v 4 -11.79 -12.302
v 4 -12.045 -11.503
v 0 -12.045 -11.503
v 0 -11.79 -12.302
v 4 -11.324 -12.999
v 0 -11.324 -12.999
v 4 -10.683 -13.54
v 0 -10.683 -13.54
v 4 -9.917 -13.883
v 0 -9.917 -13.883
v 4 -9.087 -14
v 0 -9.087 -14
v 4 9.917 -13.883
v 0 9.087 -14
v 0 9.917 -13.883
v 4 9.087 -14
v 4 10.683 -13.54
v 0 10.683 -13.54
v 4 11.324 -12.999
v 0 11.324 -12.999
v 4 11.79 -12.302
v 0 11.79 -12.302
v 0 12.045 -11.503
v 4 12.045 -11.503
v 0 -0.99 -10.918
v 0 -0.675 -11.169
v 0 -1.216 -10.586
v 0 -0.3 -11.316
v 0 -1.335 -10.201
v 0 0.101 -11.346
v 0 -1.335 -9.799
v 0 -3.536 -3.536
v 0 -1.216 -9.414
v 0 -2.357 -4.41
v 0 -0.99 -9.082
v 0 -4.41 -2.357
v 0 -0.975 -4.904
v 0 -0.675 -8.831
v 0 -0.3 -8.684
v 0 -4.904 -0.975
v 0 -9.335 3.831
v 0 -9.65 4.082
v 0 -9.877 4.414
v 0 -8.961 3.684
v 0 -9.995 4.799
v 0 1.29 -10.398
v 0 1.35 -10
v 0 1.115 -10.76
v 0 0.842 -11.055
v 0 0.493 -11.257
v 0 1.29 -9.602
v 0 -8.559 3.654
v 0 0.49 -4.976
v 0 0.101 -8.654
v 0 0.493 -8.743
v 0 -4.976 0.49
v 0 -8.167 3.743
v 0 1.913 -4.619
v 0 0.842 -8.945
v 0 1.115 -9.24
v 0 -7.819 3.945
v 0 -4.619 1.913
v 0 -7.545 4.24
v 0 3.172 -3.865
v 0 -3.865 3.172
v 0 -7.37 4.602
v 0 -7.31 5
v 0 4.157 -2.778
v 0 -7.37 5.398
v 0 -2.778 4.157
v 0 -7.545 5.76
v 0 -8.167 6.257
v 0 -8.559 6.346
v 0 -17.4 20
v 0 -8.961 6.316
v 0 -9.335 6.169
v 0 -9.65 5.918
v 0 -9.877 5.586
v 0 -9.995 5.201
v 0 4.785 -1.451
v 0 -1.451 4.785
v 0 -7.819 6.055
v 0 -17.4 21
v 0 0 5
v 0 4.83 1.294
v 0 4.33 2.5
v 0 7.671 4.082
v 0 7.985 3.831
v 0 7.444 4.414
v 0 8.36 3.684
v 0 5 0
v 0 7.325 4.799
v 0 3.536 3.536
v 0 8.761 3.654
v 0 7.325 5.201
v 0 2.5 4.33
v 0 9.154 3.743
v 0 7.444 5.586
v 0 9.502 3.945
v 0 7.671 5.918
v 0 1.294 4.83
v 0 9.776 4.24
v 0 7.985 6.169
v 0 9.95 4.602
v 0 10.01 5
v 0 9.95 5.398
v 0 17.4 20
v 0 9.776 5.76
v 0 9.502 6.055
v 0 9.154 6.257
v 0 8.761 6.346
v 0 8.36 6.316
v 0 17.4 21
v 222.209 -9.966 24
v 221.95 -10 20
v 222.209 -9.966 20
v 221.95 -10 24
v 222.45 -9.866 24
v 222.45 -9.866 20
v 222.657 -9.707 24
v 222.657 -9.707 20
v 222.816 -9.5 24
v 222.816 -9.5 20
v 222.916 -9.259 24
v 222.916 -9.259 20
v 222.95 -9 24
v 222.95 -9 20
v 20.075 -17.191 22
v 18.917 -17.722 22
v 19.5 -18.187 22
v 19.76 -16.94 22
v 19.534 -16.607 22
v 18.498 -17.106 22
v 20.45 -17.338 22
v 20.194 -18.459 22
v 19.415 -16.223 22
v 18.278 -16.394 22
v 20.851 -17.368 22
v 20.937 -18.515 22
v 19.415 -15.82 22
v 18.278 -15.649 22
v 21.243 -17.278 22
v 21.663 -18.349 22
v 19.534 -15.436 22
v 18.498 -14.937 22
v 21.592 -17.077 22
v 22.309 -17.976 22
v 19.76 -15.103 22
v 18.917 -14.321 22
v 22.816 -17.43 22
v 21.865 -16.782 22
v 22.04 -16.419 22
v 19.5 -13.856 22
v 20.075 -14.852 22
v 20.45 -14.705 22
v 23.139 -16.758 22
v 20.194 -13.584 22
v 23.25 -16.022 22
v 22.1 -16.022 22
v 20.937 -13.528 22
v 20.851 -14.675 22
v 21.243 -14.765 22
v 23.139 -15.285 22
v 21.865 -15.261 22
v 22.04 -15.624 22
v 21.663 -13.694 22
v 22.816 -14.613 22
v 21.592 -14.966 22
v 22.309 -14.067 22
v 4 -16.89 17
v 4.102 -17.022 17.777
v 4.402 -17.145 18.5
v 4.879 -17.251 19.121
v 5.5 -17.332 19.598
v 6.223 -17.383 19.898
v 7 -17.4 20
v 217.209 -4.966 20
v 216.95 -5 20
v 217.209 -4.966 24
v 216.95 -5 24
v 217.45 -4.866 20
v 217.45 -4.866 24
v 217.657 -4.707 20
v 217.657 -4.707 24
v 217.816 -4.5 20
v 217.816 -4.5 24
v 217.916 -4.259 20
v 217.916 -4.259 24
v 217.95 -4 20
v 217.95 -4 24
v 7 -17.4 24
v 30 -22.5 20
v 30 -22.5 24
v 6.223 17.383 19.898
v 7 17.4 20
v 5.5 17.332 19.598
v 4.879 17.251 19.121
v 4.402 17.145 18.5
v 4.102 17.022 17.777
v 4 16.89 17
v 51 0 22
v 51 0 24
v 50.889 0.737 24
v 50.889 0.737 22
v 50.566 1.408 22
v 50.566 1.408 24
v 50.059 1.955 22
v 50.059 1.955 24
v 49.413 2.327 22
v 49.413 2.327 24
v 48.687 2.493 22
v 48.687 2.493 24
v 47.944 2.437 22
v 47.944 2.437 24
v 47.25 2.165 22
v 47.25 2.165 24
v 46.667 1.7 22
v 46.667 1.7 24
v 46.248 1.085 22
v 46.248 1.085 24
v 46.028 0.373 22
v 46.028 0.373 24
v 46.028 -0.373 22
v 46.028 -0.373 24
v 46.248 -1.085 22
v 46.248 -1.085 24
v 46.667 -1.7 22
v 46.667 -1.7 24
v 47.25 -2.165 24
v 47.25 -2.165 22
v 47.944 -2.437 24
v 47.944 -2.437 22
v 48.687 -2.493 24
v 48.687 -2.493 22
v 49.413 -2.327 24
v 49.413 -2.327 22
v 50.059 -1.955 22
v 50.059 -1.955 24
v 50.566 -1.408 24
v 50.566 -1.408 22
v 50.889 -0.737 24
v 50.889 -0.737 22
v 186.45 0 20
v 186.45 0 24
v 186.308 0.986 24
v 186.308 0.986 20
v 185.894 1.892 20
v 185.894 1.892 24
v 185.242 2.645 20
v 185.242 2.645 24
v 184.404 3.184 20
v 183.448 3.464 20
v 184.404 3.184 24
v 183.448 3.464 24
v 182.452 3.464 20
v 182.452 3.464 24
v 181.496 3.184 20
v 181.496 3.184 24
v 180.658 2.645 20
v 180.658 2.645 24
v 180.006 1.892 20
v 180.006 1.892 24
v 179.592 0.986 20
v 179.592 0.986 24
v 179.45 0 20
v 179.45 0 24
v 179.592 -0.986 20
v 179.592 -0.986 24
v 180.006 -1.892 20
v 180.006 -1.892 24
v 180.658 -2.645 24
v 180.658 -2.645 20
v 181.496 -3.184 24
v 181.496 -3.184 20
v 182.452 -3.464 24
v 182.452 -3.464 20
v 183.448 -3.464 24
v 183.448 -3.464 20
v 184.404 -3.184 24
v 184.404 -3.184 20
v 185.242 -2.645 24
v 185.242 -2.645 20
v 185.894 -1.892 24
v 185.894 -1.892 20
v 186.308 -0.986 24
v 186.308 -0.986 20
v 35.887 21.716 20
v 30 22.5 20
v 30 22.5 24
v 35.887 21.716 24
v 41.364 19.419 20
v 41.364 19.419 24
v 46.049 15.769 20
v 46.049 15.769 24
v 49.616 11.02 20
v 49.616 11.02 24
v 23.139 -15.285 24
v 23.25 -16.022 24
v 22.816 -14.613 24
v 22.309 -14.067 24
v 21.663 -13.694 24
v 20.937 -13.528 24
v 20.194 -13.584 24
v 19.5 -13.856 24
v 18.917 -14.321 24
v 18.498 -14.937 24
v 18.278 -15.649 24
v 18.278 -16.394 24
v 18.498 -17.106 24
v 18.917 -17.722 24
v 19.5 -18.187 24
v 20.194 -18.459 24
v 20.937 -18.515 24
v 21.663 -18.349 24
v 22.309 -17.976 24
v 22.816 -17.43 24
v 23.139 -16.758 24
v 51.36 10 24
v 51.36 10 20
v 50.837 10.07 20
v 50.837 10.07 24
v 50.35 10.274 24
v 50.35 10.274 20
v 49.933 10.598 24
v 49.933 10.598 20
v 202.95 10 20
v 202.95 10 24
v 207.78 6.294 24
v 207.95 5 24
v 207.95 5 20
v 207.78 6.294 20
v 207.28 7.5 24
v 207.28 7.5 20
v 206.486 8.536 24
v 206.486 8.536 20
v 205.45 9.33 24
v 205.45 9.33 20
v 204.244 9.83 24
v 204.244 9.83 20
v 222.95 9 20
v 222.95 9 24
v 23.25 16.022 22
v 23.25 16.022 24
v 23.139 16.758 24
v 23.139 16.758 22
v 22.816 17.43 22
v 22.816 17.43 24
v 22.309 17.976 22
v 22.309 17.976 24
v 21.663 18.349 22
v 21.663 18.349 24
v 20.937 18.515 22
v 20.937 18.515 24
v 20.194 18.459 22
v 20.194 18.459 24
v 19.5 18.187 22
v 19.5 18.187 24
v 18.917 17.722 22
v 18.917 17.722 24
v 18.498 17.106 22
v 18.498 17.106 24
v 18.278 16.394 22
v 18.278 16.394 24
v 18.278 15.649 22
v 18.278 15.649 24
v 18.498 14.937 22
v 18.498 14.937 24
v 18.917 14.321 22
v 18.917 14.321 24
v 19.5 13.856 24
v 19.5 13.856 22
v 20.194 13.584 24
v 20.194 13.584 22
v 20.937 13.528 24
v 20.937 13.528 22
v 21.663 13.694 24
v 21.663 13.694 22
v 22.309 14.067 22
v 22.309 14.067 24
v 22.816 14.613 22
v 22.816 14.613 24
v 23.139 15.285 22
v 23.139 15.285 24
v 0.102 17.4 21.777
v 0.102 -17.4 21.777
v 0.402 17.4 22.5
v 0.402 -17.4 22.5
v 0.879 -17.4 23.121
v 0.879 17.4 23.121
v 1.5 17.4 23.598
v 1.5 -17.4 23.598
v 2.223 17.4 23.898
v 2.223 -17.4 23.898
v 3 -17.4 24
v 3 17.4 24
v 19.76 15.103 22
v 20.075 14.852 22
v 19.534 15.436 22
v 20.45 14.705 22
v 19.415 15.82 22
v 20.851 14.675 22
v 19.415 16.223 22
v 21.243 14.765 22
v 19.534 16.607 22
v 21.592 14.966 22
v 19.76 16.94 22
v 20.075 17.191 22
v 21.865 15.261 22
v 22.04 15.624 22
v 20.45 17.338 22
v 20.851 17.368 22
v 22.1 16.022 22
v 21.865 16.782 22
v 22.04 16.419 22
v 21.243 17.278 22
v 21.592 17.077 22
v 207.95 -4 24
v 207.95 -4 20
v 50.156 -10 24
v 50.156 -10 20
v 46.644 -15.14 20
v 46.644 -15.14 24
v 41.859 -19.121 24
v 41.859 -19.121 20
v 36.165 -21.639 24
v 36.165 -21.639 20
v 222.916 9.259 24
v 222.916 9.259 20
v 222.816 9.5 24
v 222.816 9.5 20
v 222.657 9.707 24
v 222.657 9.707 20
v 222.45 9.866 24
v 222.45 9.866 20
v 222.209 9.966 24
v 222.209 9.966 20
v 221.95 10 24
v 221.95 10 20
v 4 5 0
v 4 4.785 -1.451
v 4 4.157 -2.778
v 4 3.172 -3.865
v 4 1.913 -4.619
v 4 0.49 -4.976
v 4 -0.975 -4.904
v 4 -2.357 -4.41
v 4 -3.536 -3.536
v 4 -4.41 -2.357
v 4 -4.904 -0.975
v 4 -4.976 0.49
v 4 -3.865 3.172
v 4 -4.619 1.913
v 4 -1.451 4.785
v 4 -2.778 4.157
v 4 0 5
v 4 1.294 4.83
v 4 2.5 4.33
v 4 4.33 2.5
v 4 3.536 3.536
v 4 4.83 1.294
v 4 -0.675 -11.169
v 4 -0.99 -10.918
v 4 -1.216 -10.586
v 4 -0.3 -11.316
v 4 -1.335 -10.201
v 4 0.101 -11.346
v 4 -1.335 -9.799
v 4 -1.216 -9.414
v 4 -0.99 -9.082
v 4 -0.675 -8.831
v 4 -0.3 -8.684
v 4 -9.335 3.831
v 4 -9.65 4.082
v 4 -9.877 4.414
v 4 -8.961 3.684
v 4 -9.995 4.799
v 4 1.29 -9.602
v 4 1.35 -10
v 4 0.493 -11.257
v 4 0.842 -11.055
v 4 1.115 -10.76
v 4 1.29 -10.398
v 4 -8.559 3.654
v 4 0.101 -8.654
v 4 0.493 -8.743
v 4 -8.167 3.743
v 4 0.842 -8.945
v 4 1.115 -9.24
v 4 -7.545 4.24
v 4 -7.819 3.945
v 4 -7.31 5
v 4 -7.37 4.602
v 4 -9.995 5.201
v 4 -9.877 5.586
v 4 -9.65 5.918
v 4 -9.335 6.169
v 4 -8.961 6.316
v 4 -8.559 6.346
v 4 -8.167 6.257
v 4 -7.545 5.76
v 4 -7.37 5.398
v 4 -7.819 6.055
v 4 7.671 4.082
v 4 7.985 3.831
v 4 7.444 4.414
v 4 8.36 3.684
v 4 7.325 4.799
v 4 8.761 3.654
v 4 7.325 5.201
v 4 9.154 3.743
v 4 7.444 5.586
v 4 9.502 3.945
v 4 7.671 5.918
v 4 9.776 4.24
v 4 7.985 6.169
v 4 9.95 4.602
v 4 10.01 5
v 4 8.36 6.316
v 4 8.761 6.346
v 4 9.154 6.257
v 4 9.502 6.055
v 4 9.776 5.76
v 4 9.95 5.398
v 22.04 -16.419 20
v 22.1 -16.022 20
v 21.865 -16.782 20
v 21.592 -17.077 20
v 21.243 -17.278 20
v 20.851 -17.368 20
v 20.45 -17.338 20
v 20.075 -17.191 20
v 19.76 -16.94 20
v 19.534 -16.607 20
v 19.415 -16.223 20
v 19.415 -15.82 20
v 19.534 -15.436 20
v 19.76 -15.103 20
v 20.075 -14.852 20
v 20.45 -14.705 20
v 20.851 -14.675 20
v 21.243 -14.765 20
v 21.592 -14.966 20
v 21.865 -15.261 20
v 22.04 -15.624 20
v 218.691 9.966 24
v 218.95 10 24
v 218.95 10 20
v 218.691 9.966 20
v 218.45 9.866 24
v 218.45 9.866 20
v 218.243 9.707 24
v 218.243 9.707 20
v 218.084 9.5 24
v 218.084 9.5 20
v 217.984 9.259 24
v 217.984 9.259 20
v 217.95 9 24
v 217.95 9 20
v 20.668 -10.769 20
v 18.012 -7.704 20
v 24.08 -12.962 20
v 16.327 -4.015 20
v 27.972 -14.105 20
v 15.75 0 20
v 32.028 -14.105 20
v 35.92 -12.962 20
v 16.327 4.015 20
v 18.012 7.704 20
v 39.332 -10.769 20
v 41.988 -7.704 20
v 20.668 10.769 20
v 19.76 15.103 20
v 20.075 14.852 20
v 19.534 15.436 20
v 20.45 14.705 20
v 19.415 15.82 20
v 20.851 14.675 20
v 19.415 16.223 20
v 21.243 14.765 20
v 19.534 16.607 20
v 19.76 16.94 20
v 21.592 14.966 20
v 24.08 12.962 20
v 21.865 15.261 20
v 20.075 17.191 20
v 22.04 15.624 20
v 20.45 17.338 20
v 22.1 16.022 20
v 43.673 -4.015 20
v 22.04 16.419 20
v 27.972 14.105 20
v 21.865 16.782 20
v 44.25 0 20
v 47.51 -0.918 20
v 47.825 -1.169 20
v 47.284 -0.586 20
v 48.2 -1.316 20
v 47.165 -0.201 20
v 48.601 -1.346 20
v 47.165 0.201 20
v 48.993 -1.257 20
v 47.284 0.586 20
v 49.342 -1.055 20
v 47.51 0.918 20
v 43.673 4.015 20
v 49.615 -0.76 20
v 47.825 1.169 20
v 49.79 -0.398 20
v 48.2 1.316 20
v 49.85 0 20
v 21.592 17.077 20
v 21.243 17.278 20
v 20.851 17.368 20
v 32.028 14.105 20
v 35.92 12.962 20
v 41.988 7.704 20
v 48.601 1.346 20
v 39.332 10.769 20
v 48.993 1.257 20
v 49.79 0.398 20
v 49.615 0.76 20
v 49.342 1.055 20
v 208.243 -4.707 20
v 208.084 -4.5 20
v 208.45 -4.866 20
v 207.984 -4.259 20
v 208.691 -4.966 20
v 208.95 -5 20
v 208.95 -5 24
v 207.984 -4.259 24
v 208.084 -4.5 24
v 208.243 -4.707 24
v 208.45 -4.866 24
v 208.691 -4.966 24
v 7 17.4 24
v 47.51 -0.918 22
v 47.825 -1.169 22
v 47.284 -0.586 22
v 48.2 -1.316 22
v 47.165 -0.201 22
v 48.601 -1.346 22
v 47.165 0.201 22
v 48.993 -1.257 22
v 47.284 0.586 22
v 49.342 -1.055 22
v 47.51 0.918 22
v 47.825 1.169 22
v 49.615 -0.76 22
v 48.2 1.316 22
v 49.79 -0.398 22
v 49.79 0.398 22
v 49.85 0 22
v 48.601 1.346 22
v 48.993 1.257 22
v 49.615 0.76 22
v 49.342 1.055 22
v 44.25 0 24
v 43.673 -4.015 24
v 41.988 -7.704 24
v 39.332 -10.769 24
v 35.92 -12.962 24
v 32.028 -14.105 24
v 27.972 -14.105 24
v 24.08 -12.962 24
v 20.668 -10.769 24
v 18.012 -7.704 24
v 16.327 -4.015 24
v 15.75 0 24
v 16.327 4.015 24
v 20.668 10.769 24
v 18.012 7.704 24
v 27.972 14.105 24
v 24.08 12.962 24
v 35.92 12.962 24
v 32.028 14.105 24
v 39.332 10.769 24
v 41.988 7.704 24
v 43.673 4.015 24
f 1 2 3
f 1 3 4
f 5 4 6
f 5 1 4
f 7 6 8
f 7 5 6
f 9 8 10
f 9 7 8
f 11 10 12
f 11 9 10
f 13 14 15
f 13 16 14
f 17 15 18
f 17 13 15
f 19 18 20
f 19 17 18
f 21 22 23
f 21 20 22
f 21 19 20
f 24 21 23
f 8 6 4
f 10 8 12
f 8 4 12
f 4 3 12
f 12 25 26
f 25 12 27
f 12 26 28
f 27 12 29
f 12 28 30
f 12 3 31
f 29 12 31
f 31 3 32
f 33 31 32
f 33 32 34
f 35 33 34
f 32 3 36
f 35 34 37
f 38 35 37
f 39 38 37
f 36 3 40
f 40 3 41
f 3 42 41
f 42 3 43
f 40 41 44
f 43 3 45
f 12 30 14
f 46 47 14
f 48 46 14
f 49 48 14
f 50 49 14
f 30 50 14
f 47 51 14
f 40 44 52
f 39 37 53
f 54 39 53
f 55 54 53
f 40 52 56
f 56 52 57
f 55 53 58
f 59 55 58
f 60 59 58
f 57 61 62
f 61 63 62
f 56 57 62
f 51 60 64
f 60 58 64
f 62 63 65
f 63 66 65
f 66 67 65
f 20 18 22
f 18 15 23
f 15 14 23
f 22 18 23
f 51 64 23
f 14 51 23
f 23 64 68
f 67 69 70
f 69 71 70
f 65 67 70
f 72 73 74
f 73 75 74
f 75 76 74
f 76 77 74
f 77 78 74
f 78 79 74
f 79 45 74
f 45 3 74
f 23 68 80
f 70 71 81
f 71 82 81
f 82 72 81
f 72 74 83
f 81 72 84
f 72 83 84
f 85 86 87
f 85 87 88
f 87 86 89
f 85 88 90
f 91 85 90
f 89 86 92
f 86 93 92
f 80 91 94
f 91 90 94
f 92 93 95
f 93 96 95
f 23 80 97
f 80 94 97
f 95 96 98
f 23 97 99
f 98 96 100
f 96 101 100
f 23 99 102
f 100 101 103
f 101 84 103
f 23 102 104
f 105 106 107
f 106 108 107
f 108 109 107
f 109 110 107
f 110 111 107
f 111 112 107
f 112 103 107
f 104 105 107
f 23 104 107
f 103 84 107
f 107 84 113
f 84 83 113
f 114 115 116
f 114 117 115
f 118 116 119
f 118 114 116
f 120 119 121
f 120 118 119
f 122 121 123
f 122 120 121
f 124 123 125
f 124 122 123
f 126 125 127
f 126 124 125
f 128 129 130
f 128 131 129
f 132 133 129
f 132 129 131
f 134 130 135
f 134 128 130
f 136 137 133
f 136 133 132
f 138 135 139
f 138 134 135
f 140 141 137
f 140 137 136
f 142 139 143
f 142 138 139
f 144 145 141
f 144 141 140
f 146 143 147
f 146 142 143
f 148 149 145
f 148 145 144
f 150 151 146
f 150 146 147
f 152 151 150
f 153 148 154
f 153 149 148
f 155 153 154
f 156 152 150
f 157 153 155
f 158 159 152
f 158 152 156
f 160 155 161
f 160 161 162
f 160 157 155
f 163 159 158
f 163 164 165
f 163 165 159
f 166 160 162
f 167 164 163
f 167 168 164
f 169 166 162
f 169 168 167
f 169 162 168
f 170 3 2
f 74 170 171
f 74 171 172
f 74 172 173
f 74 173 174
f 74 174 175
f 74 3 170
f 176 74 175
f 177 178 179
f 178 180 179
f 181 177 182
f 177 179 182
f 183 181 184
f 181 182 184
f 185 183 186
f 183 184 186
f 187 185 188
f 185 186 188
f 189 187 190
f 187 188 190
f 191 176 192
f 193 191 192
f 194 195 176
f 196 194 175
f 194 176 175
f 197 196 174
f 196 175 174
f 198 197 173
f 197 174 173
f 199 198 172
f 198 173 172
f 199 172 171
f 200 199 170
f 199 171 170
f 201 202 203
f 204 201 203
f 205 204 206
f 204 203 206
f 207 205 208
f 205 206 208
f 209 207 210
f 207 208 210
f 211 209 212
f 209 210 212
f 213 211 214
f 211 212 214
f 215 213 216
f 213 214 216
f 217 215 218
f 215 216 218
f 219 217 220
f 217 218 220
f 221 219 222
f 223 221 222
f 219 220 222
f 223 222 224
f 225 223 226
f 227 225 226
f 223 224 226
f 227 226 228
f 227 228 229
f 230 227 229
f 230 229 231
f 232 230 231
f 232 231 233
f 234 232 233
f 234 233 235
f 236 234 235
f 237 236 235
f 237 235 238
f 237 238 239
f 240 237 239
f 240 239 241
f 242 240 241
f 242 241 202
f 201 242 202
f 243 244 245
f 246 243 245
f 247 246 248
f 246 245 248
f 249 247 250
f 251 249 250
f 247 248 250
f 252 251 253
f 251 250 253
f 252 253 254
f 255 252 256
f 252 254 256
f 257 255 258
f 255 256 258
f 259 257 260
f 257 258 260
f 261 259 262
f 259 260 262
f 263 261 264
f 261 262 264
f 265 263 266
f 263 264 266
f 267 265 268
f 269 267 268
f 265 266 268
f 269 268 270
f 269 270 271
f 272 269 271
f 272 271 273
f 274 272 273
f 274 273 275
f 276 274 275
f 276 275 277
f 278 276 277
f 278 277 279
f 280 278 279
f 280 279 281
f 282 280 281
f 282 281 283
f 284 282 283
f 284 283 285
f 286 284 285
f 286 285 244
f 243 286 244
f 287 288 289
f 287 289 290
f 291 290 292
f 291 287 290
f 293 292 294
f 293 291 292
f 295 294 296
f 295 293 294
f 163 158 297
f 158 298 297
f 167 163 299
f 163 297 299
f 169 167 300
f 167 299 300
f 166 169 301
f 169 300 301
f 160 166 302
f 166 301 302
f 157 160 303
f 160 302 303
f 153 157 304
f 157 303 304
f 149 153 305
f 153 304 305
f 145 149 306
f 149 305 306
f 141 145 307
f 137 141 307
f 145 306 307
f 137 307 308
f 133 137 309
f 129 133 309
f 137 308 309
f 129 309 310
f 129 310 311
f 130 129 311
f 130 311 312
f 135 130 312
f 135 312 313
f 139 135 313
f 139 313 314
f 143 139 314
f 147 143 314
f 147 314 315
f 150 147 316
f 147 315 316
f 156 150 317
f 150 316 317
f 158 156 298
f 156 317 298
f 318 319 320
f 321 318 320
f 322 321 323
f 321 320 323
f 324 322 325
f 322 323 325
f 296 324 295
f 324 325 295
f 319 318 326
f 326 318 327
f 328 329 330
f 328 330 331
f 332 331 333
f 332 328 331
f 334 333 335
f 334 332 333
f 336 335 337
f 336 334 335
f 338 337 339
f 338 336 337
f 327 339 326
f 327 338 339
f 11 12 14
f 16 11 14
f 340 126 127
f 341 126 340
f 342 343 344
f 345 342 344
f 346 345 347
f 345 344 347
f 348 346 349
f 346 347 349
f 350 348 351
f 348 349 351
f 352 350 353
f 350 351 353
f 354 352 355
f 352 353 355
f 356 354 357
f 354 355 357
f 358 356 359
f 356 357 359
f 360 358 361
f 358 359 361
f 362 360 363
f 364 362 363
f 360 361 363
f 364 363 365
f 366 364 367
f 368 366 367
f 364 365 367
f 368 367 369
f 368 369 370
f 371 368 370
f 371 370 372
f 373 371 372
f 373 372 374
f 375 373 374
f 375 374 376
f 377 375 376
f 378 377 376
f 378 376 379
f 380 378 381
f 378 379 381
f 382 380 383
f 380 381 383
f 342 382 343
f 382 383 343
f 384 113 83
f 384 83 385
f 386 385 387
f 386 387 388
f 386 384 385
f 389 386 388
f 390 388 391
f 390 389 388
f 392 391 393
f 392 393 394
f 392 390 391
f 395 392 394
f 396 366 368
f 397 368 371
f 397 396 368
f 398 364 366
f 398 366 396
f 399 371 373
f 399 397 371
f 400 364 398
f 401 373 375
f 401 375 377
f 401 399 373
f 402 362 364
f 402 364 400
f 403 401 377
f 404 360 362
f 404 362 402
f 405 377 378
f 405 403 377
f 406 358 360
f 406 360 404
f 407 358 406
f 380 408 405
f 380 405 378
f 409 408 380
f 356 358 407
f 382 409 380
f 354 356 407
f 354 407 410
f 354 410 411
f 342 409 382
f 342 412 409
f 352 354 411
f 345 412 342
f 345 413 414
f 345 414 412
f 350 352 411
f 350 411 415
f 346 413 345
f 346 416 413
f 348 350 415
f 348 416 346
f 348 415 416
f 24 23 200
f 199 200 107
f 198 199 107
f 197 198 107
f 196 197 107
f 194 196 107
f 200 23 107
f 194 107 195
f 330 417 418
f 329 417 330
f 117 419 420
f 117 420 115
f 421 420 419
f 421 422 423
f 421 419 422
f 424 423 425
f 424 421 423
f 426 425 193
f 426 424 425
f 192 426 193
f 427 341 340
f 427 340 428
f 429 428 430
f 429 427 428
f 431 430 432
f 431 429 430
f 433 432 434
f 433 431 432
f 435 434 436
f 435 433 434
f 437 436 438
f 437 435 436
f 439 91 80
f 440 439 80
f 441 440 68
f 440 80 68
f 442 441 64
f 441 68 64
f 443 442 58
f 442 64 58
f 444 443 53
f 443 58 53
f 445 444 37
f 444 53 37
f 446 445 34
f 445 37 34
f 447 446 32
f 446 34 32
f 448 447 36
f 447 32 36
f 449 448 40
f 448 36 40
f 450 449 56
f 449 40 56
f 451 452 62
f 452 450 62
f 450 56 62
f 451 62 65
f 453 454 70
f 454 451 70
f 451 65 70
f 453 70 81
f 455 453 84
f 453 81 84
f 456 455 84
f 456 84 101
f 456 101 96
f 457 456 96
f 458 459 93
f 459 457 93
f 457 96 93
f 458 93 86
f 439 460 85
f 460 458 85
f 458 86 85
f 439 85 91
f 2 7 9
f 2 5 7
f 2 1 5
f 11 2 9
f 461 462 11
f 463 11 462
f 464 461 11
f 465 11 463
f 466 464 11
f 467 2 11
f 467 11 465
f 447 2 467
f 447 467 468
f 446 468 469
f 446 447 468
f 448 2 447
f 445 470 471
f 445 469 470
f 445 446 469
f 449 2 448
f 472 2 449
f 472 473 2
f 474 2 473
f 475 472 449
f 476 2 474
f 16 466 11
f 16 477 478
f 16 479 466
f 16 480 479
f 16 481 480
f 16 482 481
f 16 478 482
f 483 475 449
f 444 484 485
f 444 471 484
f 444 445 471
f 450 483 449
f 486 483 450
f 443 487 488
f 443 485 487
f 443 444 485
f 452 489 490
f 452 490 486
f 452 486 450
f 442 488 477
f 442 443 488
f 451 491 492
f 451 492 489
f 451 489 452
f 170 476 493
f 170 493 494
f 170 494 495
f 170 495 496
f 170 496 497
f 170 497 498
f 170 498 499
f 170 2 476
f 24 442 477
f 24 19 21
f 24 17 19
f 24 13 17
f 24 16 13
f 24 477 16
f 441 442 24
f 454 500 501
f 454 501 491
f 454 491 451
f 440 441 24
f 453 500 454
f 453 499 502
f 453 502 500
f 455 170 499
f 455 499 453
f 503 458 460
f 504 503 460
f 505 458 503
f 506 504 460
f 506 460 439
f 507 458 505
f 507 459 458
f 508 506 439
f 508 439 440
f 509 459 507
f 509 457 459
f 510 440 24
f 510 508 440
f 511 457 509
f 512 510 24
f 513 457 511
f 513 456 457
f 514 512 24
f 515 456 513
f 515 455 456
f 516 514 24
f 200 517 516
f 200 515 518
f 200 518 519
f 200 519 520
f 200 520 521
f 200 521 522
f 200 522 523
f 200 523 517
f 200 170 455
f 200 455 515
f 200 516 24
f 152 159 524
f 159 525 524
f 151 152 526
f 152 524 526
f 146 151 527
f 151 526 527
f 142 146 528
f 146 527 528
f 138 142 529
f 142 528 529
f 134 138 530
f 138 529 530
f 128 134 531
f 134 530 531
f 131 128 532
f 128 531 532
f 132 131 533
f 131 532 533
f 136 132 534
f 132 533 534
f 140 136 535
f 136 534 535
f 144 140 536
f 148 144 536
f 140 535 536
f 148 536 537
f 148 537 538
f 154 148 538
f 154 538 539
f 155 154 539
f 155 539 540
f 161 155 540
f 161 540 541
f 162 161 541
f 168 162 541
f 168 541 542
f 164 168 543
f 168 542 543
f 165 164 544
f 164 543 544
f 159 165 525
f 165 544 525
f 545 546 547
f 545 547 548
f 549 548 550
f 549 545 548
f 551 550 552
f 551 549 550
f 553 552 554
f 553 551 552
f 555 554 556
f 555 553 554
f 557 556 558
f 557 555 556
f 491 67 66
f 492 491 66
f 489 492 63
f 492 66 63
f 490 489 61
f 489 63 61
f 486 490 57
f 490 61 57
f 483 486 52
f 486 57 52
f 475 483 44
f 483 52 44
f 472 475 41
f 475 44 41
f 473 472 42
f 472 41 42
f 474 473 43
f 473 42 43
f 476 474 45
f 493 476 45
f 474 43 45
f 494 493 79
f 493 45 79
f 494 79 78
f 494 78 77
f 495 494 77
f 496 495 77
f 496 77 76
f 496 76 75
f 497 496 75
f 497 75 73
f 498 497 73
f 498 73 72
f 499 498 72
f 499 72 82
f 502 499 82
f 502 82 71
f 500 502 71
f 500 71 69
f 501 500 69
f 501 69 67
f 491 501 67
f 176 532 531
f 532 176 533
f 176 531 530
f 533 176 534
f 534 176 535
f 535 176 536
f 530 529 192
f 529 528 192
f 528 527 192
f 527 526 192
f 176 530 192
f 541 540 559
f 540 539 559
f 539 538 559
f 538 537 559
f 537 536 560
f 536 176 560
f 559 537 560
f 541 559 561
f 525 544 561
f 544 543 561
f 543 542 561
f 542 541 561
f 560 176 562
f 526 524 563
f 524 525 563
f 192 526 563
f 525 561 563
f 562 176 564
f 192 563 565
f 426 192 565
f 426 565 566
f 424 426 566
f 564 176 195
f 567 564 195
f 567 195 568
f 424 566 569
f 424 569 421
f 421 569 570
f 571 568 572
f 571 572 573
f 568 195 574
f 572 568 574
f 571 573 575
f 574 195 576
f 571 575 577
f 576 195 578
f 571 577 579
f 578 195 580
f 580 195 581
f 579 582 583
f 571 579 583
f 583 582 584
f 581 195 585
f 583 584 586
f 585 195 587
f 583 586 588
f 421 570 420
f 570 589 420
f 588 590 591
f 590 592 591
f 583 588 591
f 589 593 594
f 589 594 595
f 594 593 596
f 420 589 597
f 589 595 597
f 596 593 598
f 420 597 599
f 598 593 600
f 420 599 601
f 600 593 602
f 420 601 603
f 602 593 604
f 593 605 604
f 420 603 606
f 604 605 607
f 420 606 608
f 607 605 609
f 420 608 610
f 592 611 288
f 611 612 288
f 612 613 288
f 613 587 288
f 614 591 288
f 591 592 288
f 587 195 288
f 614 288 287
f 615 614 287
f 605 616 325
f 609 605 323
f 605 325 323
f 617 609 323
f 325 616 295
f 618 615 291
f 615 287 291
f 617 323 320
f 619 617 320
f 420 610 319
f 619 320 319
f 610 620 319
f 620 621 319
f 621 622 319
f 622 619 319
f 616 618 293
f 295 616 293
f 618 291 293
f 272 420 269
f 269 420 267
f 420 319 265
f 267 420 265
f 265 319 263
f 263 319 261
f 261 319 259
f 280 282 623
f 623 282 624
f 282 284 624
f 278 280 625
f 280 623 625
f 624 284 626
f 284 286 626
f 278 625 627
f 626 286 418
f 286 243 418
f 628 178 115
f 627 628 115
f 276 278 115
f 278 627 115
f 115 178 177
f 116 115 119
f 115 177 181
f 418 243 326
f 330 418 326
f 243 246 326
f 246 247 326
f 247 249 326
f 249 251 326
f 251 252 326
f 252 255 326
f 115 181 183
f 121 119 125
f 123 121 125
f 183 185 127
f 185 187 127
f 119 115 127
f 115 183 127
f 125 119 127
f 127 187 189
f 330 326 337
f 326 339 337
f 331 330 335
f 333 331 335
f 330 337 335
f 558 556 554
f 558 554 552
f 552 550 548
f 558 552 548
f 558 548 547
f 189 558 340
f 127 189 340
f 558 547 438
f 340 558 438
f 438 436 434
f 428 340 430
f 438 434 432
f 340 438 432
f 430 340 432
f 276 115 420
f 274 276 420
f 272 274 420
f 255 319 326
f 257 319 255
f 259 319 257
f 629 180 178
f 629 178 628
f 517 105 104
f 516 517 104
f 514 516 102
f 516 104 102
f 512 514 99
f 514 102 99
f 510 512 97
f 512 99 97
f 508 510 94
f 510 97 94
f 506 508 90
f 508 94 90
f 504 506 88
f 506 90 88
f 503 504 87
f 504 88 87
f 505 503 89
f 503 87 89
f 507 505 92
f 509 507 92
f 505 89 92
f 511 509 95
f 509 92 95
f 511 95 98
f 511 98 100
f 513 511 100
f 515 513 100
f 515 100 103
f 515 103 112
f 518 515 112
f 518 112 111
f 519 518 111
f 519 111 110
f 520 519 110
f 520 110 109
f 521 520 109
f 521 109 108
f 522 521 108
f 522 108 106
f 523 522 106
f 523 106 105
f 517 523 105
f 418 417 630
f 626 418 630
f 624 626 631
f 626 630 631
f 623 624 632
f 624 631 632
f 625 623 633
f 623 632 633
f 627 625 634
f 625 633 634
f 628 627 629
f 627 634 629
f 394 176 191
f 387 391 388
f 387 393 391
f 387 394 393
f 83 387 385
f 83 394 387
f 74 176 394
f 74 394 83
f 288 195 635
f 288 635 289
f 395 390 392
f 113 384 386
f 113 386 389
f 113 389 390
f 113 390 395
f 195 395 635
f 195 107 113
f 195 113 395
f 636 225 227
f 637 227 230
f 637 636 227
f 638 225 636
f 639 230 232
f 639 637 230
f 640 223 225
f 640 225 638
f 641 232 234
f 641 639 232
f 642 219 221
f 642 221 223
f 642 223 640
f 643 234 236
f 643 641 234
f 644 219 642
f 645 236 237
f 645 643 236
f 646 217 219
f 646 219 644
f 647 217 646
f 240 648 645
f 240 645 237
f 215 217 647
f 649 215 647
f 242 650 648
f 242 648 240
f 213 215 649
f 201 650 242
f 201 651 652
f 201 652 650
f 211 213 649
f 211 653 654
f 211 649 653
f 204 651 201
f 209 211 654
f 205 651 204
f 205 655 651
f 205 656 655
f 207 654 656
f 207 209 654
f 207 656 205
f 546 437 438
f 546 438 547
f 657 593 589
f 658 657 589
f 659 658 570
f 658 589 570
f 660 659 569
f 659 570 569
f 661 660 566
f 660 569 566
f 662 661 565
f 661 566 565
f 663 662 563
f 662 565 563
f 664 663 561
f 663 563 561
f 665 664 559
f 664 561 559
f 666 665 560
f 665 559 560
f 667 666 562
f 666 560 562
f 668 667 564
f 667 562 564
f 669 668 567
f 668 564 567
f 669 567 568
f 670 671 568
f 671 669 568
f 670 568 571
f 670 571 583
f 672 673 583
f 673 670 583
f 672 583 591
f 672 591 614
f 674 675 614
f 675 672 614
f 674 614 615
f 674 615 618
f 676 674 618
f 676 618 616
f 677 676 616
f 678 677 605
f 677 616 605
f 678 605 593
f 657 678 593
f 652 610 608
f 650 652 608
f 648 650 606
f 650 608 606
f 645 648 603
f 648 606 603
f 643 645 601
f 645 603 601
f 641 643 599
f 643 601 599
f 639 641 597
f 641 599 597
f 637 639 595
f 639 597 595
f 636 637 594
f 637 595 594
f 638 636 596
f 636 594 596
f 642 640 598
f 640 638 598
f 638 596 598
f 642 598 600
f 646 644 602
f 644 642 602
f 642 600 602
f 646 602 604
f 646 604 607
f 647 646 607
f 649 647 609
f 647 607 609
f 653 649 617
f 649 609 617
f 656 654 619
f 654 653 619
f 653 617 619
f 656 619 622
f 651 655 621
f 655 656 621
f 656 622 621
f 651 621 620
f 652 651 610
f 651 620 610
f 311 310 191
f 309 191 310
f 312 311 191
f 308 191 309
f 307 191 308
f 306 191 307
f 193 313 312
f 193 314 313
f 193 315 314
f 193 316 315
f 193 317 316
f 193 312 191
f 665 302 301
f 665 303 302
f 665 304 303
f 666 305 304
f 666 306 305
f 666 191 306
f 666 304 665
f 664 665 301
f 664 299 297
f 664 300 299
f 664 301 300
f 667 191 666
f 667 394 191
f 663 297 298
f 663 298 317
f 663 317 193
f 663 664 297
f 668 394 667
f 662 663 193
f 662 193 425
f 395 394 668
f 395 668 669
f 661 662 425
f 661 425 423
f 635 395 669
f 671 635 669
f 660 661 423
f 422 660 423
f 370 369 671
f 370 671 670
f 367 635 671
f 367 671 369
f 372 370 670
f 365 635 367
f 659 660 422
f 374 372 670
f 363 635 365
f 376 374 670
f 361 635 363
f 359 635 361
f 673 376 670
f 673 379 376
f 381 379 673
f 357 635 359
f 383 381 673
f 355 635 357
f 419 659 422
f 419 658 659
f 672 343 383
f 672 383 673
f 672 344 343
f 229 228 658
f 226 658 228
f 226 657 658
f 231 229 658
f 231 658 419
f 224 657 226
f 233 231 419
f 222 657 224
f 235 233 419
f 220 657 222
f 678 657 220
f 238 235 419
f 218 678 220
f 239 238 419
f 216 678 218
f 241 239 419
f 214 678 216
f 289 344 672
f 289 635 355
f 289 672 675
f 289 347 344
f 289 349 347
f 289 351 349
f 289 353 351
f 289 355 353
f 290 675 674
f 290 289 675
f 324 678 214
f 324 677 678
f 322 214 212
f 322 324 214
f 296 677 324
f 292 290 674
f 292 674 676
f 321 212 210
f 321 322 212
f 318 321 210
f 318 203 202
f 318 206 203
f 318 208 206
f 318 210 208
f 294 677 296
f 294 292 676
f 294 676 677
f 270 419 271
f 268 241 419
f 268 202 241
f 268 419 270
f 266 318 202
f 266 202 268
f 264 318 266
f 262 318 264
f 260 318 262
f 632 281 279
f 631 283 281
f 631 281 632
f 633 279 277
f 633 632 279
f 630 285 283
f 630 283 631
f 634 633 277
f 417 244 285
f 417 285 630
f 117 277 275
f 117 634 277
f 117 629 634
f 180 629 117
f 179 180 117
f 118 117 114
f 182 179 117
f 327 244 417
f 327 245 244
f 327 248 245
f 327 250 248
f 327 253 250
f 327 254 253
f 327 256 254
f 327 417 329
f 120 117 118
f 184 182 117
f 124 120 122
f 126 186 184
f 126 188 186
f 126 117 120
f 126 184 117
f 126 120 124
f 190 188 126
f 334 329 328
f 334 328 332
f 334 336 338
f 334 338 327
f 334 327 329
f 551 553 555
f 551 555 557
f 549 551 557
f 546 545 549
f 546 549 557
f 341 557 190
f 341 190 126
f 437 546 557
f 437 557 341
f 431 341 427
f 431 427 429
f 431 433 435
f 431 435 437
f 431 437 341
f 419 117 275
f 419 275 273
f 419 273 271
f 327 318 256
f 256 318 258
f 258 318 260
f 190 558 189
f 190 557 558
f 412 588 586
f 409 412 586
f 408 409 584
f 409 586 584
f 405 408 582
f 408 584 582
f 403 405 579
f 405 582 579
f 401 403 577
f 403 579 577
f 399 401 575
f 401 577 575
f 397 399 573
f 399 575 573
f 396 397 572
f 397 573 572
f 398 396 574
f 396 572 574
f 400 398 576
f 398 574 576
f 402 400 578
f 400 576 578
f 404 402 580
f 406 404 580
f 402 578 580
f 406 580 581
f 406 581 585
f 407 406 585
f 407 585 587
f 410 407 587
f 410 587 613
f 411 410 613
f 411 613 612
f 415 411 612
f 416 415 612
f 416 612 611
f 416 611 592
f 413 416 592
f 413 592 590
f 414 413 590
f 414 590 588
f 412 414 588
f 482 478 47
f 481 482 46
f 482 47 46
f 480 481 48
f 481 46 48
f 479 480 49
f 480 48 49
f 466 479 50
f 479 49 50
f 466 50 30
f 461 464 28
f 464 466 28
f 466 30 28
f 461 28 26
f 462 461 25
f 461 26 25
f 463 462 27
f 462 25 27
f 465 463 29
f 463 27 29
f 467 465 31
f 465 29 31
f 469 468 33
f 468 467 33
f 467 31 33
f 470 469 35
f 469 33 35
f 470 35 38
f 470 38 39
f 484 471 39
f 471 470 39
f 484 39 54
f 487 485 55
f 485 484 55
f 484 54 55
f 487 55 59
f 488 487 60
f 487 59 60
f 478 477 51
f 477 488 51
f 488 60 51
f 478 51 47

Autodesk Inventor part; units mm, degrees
ref_plane "YZ Plane" through (0, 0, 0) normal (1, 0, 0) x (0, 1, 0)
ref_plane "XZ Plane" through (0, 0, 0) normal (0, 1, 0) x (-1, 0, 0)
ref_plane "XY Plane" through (0, 0, 0) normal (0, 0, 1) x (1, 0, 0)
sketch "スケッチ1" plane through (0, 0, 0) normal (1, 0, 0) x (0, 1, 0)
  circle A0 centre (0, 0) radius 10
  circle A1 centre (0, -10) radius 1.35
  circle A2 centre (8.6603, 5) radius 1.35
  circle A3 centre (-8.6603, 5) radius 1.35
  circle A4 centre (0, 0) radius 5
  line L0 (0, 0) -> (0, 50)
  circle A5 centre (0, 50) radius 22.5
  circle A6 centre (0, 0) radius 14
  line L1 (-14, 0) -> (-22.5, 50)
  line L2 (14, 0) -> (22.5, 50)
  line L3 (0, -14) -> (-11.62, -14)
  line L4 (-11.62, -14) -> (-14, 0)
  line L5 (0, -14) -> (11.62, -14)
  line L6 (11.62, -14) -> (14, 0)
  line L7 (0, 20) -> (-17.4, 20)
  line L8 (0, 20) -> (17.4, 20)
  dimension "d0" = 20
  dimension "d1" = 2.7
  dimension "d4" = 360
  dimension "d6" = 10
  dimension "d7" = 50
  dimension "d8" = 45
  dimension "d9" = 28
extrude "押し出し1" add sketch "スケッチ1" along normal blind 4 contours A0 A1 A3 A2 | A6 L6 L4 | A6 L1 L7 L0 | L0 L8 L2 A6 | L6 L5 A6 | A6 L3 L4
sketch "スケッチ2" plane through (0, -17.4, 20) normal (0, 0, 1) x (1, 0, 0)
  line L0 (0, 17.4) -> (30, 17.4)
  circle A0 centre (30, 17.4) radius 22.5
  circle A1 centre (30, 17.4) radius 18.5
  circle A2 centre (30, 17.4) radius 14.25
  circle A3 centre (48.5, 17.4) radius 1.35
  circle A4 centre (20.75, 33.4215) radius 1.35
  circle A5 centre (20.75, 1.3785) radius 1.35
  line L1 (0, 29.02) -> (0, 34.8) projected
  line L2 (0, 0) -> (0, 5.78) projected
  line L3 (0, 34.8) -> (0, 0)
  line L4 (4, 29.02) -> (4, 34.8) projected
  line L5 (4, 34.8) -> (7, 34.8)
  line L6 (7, 34.8) -> (30, 39.9)
  line L7 (4, 0) -> (4, 5.78) projected
  line L8 (4, 0) -> (7, 0)
  line L9 (7, 0) -> (30, -5.1)
  line L10 (4, 0) -> (0, 0)
  line L11 (0, 34.8) -> (4, 34.8) projected
  line L12 (0, 0) -> (0, 34.8)
  line L13 (0, 34.8) -> (4, 34.8)
  dimension "d14" = 37
  dimension "d12" = 30
  dimension "d13" = 45
  dimension "d15" = 28.5
  dimension "d16" = 2.7
  dimension "d19" = 360
  dimension "d21" = 3
  dimension "d22" = 3
extrude "押し出し2" add sketch "スケッチ2" along normal blind 4 contours L3 L1 L11 L5 L6 A0 L0 | L0 A0 L9 L8 L10 L2 L3 | A1 A4 A3 A5 | A0 L6 L9
fillet "フィレット1" radius 3 2 edges at (4, 0, 20) (0, 0, 24)
fillet "フィレット2" radius 3 2 edges at (2, -11.62, -14) (2, 11.62, -14)
sketch "スケッチ7" plane through (0, -17.4, 24) normal (0, 0, 1) x (1, 0, 0)
  circle A0 centre (30, 17.4) radius 14.25 projected
  line L0 (30, 17.4) -> (182.95, 17.4)
  line L1 (30, 17.4) -> (182.95, 17.4) construction
  circle A1 centre (182.95, 17.4) radius 3.5
  circle A2 centre (182.95, 17.4) radius 10
  line L2 (182.95, 27.4) -> (50.1556, 27.4)
  arc A3 (30, -5.1) -> (30, 39.9) centre (30, 17.4) ccw projected
  line L3 (182.95, 27.4) -> (315.7444, 27.4) construction
  line L4 (182.95, 7.4) -> (50.1556, 7.4)
  point P0 (0, 17.4)
  dimension "d55" = 152.95
  dimension "d56" = 0
  dimension "d57" = 7
  dimension "d58" = 20
  dimension "d59" = 180
extrude "押し出し7" add sketch "スケッチ7" against normal blind 4 contours A3 L2 A2 L0 | L0 A2 L4 A3 | A2
sketch "スケッチ8" plane through (0, -17.4, 24) normal (0, 0, 1) x (1, 0, 0)
  circle A0 centre (20.75, 33.4215) radius 1.35 projected
  circle A1 centre (20.75, 33.4215) radius 2.5
  circle A2 centre (48.5, 17.4) radius 1.35 projected
  circle A3 centre (48.5, 17.4) radius 2.5
  circle A4 centre (20.75, 1.3785) radius 1.35 projected
  circle A5 centre (20.75, 1.3785) radius 2.5
  point P0 (0, 17.4)
  dimension "d63" = 5
  dimension "d64" = 5
  dimension "d65" = 5
extrude "押し出し8" cut sketch "スケッチ8" against normal blind 2 contours A0 | A1 | A3 | A4 | A5
fillet "フィレット4" radius 2 1 edges at (50.1556, 10, 22)
sketch "スケッチ11" plane through (0, -17.4, 24) normal (0, 0, 1) x (1, 0, 0)
  line L0 (51.36, 27.4) -> (182.95, 27.4) projected
  line L1 (182.95, 27.4) -> (202.95, 27.4)
  arc A0 (182.95, 7.4) -> (182.95, 27.4) centre (182.95, 17.4) ccw projected
  line L2 (182.95, 7.4) -> (207.95, 7.4)
  line L3 (207.95, 13.4) -> (207.95, 22.4)
  line L4 (207.95, 7.4) -> (221.95, 7.4)
  line L5 (222.95, 8.4) -> (222.95, 26.4)
  line L6 (221.95, 27.4) -> (218.95, 27.4)
  line L7 (217.95, 26.4) -> (217.95, 13.4)
  line L8 (216.95, 12.4) -> (208.95, 12.4)
  arc A1 (222.95, 26.4) -> (221.95, 27.4) centre (221.95, 26.4) ccw
  arc A2 (218.95, 27.4) -> (217.95, 26.4) centre (218.95, 26.4) ccw
  arc A3 (221.95, 7.4) -> (222.95, 8.4) centre (221.95, 8.4) ccw
  arc A4 (216.95, 12.4) -> (217.95, 13.4) centre (216.95, 13.4) ccw
  arc A5 (207.95, 13.4) -> (208.95, 12.4) centre (208.95, 13.4) ccw
  arc A6 (207.95, 22.4) -> (202.95, 27.4) centre (202.95, 22.4) ccw
  point P0 (0, 17.4)
  point P1 (207.95, 27.4)
  point P2 (222.95, 7.4)
  point P3 (222.95, 27.4)
  point P4 (217.95, 27.4)
  point P5 (217.95, 12.4)
  dimension "d83" = 25
  dimension "d84" = 15
  dimension "d85" = 20
  dimension "d86" = 5
  dimension "d87" = 15
  dimension "d88" = 1
  dimension "d89" = 5
extrude "押し出し11" add sketch "スケッチ11" against normal blind 4
properties part number "motor_holder_2" material "ABS プラスチック"
